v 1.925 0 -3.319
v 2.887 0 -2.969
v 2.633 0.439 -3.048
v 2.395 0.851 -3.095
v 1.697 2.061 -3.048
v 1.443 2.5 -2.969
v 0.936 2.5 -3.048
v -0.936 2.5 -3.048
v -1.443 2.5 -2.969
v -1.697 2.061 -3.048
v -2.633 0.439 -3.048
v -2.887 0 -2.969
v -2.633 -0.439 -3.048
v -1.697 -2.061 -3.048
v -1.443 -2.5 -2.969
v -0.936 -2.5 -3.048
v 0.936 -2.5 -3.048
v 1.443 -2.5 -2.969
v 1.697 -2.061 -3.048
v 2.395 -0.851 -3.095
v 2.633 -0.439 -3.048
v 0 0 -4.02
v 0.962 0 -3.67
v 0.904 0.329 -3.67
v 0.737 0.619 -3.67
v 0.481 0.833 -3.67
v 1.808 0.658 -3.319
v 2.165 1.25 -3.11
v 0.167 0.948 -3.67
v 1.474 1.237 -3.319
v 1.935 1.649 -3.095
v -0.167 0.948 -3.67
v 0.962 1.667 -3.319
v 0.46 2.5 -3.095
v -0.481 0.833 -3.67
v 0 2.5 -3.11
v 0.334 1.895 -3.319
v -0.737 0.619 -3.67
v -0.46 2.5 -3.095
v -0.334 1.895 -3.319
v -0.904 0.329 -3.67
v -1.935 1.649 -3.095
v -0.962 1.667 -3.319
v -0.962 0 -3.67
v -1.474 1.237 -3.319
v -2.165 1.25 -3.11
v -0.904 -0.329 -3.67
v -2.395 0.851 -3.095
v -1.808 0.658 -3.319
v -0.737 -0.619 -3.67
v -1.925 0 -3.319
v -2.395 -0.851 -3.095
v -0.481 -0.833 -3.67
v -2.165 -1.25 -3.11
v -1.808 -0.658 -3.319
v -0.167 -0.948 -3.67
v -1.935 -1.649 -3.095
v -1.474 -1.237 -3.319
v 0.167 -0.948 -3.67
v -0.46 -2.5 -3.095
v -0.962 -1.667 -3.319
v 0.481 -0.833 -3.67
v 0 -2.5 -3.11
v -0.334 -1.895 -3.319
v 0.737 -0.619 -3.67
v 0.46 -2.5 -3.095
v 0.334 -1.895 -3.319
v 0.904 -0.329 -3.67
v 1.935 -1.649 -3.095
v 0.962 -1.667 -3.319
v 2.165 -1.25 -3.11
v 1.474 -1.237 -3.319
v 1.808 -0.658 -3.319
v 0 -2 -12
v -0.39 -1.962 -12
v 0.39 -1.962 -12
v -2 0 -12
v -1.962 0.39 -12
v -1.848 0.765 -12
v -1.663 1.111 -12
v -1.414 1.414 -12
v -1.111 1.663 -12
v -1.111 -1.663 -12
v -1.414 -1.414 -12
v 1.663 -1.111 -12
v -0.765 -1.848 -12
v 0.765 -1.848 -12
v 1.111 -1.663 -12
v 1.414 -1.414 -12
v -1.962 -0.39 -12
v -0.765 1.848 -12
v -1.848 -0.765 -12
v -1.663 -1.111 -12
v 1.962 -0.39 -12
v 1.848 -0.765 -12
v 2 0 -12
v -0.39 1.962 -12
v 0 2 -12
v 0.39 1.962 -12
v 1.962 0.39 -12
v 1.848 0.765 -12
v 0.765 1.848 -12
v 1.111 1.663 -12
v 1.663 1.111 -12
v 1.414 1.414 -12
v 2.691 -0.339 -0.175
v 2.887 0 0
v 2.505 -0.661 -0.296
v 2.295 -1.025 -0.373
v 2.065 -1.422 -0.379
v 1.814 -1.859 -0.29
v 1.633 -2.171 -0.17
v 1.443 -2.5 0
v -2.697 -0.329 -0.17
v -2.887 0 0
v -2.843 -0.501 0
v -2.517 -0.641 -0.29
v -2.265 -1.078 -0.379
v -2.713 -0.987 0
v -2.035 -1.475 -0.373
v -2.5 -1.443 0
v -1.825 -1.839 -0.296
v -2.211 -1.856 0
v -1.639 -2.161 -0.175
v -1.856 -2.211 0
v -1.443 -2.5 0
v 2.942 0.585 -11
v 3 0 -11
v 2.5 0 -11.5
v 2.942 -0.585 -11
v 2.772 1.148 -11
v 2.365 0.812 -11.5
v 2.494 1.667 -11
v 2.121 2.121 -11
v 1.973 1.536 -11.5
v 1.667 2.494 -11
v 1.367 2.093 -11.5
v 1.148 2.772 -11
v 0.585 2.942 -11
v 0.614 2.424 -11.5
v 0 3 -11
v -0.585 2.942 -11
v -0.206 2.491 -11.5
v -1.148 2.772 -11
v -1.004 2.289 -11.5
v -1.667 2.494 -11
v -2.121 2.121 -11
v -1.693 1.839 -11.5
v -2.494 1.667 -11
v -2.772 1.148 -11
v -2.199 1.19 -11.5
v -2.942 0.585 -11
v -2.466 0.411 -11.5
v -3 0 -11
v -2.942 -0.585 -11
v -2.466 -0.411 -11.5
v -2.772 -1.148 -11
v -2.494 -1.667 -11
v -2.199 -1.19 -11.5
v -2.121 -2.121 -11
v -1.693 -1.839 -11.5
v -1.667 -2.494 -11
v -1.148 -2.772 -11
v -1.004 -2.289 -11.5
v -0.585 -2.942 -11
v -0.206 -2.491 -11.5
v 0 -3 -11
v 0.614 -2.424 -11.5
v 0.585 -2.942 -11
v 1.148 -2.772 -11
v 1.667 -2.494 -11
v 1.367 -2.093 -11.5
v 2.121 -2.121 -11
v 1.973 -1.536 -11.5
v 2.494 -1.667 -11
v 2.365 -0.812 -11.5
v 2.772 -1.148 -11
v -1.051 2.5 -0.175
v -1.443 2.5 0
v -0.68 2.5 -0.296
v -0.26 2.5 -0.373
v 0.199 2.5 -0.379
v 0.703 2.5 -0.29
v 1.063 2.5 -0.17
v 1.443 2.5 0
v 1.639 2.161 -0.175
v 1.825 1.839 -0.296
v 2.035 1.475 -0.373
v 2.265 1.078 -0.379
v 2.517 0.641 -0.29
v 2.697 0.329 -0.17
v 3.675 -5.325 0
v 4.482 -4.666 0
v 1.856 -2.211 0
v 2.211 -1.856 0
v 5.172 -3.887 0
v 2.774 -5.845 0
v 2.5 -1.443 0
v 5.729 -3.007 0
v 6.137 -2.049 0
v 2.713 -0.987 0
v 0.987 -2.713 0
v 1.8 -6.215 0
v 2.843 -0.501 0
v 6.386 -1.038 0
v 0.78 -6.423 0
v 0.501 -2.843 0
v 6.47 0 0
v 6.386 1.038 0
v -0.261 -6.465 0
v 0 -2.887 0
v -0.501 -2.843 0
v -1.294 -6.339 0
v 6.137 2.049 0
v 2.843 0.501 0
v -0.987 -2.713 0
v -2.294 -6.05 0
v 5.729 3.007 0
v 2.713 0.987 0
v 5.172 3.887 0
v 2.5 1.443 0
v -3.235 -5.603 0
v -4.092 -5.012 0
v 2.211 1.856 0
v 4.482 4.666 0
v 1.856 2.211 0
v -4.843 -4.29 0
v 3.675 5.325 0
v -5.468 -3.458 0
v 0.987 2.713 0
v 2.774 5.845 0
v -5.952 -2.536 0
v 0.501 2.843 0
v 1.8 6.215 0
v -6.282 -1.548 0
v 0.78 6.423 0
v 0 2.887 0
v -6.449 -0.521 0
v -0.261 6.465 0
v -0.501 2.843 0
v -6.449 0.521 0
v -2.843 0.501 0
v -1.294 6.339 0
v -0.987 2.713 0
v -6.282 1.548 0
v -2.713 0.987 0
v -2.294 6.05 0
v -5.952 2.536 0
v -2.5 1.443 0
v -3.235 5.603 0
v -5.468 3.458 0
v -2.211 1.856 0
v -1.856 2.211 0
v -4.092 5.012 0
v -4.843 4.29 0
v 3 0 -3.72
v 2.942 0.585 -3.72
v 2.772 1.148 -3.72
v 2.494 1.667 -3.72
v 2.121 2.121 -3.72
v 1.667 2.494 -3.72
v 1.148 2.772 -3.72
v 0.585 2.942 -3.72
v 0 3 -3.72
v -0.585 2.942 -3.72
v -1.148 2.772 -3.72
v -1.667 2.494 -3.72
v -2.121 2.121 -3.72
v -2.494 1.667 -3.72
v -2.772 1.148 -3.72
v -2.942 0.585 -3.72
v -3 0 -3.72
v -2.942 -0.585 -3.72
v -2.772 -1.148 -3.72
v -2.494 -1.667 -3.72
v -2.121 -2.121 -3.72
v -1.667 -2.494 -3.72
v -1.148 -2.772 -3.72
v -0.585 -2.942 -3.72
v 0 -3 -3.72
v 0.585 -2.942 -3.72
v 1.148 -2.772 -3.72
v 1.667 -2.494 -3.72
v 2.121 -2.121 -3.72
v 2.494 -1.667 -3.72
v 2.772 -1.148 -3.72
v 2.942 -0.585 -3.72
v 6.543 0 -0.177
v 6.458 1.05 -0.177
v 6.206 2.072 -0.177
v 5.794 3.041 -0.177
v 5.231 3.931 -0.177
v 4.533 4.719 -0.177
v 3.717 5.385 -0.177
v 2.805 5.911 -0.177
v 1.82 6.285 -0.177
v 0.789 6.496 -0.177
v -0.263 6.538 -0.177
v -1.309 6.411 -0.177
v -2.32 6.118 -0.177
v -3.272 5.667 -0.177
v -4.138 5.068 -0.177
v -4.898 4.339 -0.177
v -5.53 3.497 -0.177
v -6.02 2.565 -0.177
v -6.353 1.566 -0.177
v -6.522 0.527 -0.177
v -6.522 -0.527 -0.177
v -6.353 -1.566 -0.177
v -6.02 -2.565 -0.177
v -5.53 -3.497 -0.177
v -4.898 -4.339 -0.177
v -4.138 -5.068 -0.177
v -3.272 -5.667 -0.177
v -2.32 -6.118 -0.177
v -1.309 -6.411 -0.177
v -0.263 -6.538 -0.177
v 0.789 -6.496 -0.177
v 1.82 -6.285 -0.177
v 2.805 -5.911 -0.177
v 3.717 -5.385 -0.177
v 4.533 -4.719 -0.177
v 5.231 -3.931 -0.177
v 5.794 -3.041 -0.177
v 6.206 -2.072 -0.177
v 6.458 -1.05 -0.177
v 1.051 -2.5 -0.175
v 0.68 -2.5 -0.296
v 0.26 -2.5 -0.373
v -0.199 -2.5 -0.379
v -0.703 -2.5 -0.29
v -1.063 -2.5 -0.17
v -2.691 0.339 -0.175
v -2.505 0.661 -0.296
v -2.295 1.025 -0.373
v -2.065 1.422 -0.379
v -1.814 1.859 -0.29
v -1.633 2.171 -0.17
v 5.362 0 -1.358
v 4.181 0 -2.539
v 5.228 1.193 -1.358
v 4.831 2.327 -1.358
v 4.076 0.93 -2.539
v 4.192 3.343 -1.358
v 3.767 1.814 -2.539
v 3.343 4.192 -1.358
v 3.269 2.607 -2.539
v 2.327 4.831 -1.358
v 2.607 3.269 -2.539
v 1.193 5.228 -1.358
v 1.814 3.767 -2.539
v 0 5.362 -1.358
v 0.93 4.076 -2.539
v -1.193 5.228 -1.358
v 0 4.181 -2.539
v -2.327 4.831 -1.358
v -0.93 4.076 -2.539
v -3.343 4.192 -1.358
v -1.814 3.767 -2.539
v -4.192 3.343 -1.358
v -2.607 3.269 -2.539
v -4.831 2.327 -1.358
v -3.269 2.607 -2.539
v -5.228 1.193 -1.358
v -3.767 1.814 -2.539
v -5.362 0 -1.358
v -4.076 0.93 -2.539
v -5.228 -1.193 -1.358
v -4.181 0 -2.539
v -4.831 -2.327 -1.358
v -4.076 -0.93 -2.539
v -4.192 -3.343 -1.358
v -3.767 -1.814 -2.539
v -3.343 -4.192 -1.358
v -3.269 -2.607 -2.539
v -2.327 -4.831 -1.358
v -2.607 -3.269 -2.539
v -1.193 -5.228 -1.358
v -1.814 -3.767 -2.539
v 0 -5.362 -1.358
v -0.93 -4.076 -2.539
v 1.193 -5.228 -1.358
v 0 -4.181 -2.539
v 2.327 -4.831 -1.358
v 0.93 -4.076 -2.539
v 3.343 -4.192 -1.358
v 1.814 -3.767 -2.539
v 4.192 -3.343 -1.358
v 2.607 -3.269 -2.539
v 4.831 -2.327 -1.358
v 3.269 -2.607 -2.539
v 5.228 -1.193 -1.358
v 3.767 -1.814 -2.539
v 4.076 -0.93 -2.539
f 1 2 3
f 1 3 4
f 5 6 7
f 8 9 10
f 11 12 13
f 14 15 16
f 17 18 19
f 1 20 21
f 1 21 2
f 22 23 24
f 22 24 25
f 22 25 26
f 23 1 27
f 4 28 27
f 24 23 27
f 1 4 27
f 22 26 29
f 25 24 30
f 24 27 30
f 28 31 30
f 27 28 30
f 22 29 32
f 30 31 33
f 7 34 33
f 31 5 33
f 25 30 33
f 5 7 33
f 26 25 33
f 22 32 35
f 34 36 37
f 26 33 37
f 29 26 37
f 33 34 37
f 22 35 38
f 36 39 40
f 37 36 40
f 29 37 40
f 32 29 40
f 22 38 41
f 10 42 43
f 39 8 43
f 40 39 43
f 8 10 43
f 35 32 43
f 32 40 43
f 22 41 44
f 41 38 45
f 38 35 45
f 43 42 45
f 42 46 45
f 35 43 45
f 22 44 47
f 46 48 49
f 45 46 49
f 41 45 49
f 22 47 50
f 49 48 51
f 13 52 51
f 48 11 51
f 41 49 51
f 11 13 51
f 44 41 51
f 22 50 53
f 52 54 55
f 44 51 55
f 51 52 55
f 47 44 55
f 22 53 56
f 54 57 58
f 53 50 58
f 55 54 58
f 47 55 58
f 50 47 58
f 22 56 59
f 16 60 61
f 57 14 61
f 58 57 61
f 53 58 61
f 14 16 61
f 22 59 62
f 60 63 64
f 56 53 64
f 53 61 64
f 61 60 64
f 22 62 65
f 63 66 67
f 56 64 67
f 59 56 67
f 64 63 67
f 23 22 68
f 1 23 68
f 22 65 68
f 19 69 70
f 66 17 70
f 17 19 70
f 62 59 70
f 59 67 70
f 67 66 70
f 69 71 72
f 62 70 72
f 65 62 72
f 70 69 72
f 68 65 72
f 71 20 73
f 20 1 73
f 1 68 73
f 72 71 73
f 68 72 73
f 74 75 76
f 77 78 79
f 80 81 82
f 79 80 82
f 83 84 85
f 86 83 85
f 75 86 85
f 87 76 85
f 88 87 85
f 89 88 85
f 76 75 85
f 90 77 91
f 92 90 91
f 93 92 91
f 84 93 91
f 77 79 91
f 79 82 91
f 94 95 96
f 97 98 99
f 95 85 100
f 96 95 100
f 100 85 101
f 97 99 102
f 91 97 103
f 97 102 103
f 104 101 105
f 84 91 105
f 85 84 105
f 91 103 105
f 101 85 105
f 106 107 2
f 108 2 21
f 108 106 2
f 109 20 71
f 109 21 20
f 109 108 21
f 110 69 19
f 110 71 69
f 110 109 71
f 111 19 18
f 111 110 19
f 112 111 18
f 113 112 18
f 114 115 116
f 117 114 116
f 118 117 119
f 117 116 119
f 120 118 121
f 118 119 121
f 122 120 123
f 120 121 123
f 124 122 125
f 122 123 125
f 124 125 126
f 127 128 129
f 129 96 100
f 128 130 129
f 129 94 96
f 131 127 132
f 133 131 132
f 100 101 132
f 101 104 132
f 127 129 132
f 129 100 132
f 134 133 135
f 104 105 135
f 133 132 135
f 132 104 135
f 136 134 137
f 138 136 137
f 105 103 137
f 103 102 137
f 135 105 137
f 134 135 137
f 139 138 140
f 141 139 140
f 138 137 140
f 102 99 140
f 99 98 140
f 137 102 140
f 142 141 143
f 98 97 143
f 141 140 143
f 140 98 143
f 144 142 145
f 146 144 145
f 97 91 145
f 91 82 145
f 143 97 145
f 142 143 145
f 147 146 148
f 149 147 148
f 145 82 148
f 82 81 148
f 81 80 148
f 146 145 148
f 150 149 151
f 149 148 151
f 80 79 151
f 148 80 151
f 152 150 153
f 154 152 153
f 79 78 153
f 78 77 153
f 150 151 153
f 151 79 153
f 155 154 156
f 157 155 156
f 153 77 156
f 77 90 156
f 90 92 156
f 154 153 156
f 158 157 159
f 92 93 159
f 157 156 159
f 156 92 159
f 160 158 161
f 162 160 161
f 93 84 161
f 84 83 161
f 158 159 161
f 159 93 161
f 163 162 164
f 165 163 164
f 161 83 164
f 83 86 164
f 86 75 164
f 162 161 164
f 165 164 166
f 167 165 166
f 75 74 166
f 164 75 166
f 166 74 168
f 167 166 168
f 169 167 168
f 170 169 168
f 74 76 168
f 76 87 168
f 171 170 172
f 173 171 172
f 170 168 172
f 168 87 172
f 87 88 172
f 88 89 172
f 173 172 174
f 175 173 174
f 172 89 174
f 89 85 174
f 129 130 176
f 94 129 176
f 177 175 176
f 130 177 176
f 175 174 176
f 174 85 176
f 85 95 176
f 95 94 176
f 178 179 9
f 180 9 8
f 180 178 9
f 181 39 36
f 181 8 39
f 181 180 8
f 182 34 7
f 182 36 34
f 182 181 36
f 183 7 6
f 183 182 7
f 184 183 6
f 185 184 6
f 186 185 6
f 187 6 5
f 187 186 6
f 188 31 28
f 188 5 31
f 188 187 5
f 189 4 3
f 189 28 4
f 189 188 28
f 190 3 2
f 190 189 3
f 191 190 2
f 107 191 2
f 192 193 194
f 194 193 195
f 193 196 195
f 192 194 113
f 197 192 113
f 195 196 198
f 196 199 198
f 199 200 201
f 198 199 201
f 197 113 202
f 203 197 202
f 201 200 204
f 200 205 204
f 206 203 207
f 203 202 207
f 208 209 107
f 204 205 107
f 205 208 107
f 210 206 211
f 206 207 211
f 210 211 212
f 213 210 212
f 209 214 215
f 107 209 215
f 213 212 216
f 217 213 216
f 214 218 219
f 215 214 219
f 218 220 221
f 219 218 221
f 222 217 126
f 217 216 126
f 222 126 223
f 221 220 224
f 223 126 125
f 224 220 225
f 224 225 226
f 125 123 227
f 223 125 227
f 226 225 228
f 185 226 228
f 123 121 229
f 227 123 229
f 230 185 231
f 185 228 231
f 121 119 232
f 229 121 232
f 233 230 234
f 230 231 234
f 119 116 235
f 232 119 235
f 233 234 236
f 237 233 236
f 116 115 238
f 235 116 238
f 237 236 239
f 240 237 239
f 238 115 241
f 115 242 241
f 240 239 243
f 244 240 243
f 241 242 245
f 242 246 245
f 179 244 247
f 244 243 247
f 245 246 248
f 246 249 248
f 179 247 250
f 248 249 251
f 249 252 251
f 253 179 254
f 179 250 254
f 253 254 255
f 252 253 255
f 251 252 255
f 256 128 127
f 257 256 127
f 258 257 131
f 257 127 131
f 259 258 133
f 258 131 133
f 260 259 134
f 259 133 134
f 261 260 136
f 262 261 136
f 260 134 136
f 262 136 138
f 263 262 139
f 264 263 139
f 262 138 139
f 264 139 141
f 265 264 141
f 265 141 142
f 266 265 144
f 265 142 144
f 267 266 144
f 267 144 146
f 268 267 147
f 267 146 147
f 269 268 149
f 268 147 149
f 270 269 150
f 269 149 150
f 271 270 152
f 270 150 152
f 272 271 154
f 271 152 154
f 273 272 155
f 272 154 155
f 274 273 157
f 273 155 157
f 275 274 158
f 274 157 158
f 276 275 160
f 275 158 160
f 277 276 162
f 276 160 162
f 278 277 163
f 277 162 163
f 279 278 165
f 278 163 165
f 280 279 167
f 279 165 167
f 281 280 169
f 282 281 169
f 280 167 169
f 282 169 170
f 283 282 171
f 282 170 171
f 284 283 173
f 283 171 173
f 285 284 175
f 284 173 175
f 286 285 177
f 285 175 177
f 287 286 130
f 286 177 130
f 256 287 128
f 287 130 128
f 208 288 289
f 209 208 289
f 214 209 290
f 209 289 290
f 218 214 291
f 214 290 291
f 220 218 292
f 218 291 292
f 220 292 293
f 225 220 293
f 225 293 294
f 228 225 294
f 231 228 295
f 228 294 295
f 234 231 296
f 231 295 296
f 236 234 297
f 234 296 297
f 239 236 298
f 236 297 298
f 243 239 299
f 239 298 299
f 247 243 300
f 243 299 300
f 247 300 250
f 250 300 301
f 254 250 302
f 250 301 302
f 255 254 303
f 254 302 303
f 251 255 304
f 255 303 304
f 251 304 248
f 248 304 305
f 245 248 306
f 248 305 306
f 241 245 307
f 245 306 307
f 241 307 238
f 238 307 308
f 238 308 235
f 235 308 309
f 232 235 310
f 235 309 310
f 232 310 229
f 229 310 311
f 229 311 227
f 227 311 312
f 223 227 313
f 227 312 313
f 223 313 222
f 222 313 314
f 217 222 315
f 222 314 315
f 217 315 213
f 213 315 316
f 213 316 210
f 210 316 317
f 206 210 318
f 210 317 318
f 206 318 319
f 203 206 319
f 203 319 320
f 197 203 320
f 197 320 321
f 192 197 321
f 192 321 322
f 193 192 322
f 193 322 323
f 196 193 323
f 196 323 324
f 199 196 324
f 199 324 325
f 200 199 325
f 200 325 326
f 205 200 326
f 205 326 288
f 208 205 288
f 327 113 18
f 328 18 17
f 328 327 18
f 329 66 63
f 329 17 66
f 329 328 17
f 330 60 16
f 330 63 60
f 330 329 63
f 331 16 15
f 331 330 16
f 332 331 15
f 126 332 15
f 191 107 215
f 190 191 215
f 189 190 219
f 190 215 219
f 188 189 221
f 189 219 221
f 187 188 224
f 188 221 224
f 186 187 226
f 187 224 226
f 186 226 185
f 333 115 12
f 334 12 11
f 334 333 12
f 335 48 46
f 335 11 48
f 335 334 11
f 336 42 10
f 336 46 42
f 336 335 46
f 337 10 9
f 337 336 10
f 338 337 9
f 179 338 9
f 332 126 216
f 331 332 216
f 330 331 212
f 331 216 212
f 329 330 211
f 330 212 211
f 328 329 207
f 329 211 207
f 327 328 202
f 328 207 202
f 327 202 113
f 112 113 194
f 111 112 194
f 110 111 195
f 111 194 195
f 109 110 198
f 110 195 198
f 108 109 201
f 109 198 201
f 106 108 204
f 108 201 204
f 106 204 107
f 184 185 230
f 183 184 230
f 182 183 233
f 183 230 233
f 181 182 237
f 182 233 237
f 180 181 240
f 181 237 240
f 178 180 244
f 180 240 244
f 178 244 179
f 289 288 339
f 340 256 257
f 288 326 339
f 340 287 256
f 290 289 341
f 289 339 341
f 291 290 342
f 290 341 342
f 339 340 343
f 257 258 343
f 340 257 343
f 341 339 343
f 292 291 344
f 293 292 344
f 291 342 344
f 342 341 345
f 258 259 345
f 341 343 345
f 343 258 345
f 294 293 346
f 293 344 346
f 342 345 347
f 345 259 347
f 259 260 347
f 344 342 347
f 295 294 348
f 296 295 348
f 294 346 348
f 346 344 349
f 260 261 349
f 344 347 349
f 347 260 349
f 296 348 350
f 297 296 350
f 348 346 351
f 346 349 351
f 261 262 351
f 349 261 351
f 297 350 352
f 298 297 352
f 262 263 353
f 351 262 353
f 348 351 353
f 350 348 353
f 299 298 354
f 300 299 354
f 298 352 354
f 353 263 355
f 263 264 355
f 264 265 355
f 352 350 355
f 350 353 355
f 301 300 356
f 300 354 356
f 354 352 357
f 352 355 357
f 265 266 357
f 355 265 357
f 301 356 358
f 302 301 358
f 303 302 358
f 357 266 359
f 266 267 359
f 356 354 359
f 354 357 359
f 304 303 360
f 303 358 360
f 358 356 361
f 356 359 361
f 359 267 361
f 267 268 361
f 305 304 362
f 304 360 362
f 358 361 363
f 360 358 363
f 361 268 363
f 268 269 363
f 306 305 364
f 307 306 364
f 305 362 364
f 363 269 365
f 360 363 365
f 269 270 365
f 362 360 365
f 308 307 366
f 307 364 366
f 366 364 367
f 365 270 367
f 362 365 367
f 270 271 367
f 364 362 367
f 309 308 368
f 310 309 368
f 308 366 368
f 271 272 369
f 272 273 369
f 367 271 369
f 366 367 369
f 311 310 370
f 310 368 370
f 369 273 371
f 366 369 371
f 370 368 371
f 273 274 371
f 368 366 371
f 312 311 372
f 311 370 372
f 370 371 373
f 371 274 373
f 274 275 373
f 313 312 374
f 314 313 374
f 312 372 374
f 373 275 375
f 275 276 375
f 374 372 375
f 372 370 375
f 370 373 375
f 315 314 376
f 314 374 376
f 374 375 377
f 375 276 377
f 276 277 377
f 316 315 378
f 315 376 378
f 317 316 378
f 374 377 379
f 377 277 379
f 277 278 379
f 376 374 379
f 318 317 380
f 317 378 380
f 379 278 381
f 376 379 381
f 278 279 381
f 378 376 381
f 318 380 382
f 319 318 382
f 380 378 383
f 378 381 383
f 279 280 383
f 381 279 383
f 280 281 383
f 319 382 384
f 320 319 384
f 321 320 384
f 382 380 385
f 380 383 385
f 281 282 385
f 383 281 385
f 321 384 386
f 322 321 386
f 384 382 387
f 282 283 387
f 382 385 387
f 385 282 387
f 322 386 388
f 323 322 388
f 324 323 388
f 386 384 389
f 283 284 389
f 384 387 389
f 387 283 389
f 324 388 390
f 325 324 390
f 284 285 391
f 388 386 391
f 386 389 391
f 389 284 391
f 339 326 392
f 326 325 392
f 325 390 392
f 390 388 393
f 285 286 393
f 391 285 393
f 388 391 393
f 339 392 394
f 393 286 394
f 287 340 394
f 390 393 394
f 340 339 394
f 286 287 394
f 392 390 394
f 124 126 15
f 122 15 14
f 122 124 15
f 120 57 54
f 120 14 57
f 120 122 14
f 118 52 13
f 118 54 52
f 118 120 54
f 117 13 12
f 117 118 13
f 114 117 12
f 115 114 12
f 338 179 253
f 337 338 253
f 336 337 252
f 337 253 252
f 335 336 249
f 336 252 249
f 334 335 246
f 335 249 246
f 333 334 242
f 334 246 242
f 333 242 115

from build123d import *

# Parameters (mm, degrees)
SKETCH001_R     = 6
POCKET_DEPTH    = 5.020854
CHAMFER_SIZE    = 0.25
CHAMFER001_SIZE = 1


with BuildPart() as pocket:
    # Sketch003 → Revolution001 (revolve)
    with BuildSketch(Plane.XZ):
        Polygon((0, -4.019854), (5, -2.2), (5, 1), (0, 1), align=None)
    revolve(axis=Axis((0, 0, 0), (0, 0, 1)))

    # Sketch001 → Pocket (cut, through all)
    with BuildSketch(Plane(origin=(0, 0, 1), x_dir=(-1, 0, 0), z_dir=(0, 0, 1))):
        Circle(SKETCH001_R)
        Polygon((-1.443376, 2.5), (1.443376, 2.5), (2.886751, 0), (1.443376, -2.5), (-1.443376, -2.5), (-2.886751, 0), align=None, mode=Mode.SUBTRACT)
    extrude(amount=-POCKET_DEPTH, mode=Mode.SUBTRACT)


with BuildPart() as chamfer001:
    # Sketch → Revolution (revolve)
    with BuildSketch(Plane.XZ):
        Polygon((2.88675, 0), (6.719999, 0), (3, -3.72), (3, -12), (0, -12), (0, -2.886753), align=None)
    revolve(axis=Axis((0, 0, 0), (0, 0, 1)))

    # Cut: cut Pocket
    add(pocket.part, mode=Mode.SUBTRACT)

    # Chamfer
    chamfer_edges = [chamfer001.edges().sort_by_distance(p)[0] for p in [
        (-6.719999, 0, 0),
    ]]
    chamfer(chamfer_edges, length=CHAMFER_SIZE)

    # Chamfer001
    chamfer001_edges = [chamfer001.edges().sort_by_distance(p)[0] for p in [
        (-3, 0, -12),
    ]]
    chamfer(chamfer001_edges, length=CHAMFER001_SIZE)


solid = chamfer001.part
